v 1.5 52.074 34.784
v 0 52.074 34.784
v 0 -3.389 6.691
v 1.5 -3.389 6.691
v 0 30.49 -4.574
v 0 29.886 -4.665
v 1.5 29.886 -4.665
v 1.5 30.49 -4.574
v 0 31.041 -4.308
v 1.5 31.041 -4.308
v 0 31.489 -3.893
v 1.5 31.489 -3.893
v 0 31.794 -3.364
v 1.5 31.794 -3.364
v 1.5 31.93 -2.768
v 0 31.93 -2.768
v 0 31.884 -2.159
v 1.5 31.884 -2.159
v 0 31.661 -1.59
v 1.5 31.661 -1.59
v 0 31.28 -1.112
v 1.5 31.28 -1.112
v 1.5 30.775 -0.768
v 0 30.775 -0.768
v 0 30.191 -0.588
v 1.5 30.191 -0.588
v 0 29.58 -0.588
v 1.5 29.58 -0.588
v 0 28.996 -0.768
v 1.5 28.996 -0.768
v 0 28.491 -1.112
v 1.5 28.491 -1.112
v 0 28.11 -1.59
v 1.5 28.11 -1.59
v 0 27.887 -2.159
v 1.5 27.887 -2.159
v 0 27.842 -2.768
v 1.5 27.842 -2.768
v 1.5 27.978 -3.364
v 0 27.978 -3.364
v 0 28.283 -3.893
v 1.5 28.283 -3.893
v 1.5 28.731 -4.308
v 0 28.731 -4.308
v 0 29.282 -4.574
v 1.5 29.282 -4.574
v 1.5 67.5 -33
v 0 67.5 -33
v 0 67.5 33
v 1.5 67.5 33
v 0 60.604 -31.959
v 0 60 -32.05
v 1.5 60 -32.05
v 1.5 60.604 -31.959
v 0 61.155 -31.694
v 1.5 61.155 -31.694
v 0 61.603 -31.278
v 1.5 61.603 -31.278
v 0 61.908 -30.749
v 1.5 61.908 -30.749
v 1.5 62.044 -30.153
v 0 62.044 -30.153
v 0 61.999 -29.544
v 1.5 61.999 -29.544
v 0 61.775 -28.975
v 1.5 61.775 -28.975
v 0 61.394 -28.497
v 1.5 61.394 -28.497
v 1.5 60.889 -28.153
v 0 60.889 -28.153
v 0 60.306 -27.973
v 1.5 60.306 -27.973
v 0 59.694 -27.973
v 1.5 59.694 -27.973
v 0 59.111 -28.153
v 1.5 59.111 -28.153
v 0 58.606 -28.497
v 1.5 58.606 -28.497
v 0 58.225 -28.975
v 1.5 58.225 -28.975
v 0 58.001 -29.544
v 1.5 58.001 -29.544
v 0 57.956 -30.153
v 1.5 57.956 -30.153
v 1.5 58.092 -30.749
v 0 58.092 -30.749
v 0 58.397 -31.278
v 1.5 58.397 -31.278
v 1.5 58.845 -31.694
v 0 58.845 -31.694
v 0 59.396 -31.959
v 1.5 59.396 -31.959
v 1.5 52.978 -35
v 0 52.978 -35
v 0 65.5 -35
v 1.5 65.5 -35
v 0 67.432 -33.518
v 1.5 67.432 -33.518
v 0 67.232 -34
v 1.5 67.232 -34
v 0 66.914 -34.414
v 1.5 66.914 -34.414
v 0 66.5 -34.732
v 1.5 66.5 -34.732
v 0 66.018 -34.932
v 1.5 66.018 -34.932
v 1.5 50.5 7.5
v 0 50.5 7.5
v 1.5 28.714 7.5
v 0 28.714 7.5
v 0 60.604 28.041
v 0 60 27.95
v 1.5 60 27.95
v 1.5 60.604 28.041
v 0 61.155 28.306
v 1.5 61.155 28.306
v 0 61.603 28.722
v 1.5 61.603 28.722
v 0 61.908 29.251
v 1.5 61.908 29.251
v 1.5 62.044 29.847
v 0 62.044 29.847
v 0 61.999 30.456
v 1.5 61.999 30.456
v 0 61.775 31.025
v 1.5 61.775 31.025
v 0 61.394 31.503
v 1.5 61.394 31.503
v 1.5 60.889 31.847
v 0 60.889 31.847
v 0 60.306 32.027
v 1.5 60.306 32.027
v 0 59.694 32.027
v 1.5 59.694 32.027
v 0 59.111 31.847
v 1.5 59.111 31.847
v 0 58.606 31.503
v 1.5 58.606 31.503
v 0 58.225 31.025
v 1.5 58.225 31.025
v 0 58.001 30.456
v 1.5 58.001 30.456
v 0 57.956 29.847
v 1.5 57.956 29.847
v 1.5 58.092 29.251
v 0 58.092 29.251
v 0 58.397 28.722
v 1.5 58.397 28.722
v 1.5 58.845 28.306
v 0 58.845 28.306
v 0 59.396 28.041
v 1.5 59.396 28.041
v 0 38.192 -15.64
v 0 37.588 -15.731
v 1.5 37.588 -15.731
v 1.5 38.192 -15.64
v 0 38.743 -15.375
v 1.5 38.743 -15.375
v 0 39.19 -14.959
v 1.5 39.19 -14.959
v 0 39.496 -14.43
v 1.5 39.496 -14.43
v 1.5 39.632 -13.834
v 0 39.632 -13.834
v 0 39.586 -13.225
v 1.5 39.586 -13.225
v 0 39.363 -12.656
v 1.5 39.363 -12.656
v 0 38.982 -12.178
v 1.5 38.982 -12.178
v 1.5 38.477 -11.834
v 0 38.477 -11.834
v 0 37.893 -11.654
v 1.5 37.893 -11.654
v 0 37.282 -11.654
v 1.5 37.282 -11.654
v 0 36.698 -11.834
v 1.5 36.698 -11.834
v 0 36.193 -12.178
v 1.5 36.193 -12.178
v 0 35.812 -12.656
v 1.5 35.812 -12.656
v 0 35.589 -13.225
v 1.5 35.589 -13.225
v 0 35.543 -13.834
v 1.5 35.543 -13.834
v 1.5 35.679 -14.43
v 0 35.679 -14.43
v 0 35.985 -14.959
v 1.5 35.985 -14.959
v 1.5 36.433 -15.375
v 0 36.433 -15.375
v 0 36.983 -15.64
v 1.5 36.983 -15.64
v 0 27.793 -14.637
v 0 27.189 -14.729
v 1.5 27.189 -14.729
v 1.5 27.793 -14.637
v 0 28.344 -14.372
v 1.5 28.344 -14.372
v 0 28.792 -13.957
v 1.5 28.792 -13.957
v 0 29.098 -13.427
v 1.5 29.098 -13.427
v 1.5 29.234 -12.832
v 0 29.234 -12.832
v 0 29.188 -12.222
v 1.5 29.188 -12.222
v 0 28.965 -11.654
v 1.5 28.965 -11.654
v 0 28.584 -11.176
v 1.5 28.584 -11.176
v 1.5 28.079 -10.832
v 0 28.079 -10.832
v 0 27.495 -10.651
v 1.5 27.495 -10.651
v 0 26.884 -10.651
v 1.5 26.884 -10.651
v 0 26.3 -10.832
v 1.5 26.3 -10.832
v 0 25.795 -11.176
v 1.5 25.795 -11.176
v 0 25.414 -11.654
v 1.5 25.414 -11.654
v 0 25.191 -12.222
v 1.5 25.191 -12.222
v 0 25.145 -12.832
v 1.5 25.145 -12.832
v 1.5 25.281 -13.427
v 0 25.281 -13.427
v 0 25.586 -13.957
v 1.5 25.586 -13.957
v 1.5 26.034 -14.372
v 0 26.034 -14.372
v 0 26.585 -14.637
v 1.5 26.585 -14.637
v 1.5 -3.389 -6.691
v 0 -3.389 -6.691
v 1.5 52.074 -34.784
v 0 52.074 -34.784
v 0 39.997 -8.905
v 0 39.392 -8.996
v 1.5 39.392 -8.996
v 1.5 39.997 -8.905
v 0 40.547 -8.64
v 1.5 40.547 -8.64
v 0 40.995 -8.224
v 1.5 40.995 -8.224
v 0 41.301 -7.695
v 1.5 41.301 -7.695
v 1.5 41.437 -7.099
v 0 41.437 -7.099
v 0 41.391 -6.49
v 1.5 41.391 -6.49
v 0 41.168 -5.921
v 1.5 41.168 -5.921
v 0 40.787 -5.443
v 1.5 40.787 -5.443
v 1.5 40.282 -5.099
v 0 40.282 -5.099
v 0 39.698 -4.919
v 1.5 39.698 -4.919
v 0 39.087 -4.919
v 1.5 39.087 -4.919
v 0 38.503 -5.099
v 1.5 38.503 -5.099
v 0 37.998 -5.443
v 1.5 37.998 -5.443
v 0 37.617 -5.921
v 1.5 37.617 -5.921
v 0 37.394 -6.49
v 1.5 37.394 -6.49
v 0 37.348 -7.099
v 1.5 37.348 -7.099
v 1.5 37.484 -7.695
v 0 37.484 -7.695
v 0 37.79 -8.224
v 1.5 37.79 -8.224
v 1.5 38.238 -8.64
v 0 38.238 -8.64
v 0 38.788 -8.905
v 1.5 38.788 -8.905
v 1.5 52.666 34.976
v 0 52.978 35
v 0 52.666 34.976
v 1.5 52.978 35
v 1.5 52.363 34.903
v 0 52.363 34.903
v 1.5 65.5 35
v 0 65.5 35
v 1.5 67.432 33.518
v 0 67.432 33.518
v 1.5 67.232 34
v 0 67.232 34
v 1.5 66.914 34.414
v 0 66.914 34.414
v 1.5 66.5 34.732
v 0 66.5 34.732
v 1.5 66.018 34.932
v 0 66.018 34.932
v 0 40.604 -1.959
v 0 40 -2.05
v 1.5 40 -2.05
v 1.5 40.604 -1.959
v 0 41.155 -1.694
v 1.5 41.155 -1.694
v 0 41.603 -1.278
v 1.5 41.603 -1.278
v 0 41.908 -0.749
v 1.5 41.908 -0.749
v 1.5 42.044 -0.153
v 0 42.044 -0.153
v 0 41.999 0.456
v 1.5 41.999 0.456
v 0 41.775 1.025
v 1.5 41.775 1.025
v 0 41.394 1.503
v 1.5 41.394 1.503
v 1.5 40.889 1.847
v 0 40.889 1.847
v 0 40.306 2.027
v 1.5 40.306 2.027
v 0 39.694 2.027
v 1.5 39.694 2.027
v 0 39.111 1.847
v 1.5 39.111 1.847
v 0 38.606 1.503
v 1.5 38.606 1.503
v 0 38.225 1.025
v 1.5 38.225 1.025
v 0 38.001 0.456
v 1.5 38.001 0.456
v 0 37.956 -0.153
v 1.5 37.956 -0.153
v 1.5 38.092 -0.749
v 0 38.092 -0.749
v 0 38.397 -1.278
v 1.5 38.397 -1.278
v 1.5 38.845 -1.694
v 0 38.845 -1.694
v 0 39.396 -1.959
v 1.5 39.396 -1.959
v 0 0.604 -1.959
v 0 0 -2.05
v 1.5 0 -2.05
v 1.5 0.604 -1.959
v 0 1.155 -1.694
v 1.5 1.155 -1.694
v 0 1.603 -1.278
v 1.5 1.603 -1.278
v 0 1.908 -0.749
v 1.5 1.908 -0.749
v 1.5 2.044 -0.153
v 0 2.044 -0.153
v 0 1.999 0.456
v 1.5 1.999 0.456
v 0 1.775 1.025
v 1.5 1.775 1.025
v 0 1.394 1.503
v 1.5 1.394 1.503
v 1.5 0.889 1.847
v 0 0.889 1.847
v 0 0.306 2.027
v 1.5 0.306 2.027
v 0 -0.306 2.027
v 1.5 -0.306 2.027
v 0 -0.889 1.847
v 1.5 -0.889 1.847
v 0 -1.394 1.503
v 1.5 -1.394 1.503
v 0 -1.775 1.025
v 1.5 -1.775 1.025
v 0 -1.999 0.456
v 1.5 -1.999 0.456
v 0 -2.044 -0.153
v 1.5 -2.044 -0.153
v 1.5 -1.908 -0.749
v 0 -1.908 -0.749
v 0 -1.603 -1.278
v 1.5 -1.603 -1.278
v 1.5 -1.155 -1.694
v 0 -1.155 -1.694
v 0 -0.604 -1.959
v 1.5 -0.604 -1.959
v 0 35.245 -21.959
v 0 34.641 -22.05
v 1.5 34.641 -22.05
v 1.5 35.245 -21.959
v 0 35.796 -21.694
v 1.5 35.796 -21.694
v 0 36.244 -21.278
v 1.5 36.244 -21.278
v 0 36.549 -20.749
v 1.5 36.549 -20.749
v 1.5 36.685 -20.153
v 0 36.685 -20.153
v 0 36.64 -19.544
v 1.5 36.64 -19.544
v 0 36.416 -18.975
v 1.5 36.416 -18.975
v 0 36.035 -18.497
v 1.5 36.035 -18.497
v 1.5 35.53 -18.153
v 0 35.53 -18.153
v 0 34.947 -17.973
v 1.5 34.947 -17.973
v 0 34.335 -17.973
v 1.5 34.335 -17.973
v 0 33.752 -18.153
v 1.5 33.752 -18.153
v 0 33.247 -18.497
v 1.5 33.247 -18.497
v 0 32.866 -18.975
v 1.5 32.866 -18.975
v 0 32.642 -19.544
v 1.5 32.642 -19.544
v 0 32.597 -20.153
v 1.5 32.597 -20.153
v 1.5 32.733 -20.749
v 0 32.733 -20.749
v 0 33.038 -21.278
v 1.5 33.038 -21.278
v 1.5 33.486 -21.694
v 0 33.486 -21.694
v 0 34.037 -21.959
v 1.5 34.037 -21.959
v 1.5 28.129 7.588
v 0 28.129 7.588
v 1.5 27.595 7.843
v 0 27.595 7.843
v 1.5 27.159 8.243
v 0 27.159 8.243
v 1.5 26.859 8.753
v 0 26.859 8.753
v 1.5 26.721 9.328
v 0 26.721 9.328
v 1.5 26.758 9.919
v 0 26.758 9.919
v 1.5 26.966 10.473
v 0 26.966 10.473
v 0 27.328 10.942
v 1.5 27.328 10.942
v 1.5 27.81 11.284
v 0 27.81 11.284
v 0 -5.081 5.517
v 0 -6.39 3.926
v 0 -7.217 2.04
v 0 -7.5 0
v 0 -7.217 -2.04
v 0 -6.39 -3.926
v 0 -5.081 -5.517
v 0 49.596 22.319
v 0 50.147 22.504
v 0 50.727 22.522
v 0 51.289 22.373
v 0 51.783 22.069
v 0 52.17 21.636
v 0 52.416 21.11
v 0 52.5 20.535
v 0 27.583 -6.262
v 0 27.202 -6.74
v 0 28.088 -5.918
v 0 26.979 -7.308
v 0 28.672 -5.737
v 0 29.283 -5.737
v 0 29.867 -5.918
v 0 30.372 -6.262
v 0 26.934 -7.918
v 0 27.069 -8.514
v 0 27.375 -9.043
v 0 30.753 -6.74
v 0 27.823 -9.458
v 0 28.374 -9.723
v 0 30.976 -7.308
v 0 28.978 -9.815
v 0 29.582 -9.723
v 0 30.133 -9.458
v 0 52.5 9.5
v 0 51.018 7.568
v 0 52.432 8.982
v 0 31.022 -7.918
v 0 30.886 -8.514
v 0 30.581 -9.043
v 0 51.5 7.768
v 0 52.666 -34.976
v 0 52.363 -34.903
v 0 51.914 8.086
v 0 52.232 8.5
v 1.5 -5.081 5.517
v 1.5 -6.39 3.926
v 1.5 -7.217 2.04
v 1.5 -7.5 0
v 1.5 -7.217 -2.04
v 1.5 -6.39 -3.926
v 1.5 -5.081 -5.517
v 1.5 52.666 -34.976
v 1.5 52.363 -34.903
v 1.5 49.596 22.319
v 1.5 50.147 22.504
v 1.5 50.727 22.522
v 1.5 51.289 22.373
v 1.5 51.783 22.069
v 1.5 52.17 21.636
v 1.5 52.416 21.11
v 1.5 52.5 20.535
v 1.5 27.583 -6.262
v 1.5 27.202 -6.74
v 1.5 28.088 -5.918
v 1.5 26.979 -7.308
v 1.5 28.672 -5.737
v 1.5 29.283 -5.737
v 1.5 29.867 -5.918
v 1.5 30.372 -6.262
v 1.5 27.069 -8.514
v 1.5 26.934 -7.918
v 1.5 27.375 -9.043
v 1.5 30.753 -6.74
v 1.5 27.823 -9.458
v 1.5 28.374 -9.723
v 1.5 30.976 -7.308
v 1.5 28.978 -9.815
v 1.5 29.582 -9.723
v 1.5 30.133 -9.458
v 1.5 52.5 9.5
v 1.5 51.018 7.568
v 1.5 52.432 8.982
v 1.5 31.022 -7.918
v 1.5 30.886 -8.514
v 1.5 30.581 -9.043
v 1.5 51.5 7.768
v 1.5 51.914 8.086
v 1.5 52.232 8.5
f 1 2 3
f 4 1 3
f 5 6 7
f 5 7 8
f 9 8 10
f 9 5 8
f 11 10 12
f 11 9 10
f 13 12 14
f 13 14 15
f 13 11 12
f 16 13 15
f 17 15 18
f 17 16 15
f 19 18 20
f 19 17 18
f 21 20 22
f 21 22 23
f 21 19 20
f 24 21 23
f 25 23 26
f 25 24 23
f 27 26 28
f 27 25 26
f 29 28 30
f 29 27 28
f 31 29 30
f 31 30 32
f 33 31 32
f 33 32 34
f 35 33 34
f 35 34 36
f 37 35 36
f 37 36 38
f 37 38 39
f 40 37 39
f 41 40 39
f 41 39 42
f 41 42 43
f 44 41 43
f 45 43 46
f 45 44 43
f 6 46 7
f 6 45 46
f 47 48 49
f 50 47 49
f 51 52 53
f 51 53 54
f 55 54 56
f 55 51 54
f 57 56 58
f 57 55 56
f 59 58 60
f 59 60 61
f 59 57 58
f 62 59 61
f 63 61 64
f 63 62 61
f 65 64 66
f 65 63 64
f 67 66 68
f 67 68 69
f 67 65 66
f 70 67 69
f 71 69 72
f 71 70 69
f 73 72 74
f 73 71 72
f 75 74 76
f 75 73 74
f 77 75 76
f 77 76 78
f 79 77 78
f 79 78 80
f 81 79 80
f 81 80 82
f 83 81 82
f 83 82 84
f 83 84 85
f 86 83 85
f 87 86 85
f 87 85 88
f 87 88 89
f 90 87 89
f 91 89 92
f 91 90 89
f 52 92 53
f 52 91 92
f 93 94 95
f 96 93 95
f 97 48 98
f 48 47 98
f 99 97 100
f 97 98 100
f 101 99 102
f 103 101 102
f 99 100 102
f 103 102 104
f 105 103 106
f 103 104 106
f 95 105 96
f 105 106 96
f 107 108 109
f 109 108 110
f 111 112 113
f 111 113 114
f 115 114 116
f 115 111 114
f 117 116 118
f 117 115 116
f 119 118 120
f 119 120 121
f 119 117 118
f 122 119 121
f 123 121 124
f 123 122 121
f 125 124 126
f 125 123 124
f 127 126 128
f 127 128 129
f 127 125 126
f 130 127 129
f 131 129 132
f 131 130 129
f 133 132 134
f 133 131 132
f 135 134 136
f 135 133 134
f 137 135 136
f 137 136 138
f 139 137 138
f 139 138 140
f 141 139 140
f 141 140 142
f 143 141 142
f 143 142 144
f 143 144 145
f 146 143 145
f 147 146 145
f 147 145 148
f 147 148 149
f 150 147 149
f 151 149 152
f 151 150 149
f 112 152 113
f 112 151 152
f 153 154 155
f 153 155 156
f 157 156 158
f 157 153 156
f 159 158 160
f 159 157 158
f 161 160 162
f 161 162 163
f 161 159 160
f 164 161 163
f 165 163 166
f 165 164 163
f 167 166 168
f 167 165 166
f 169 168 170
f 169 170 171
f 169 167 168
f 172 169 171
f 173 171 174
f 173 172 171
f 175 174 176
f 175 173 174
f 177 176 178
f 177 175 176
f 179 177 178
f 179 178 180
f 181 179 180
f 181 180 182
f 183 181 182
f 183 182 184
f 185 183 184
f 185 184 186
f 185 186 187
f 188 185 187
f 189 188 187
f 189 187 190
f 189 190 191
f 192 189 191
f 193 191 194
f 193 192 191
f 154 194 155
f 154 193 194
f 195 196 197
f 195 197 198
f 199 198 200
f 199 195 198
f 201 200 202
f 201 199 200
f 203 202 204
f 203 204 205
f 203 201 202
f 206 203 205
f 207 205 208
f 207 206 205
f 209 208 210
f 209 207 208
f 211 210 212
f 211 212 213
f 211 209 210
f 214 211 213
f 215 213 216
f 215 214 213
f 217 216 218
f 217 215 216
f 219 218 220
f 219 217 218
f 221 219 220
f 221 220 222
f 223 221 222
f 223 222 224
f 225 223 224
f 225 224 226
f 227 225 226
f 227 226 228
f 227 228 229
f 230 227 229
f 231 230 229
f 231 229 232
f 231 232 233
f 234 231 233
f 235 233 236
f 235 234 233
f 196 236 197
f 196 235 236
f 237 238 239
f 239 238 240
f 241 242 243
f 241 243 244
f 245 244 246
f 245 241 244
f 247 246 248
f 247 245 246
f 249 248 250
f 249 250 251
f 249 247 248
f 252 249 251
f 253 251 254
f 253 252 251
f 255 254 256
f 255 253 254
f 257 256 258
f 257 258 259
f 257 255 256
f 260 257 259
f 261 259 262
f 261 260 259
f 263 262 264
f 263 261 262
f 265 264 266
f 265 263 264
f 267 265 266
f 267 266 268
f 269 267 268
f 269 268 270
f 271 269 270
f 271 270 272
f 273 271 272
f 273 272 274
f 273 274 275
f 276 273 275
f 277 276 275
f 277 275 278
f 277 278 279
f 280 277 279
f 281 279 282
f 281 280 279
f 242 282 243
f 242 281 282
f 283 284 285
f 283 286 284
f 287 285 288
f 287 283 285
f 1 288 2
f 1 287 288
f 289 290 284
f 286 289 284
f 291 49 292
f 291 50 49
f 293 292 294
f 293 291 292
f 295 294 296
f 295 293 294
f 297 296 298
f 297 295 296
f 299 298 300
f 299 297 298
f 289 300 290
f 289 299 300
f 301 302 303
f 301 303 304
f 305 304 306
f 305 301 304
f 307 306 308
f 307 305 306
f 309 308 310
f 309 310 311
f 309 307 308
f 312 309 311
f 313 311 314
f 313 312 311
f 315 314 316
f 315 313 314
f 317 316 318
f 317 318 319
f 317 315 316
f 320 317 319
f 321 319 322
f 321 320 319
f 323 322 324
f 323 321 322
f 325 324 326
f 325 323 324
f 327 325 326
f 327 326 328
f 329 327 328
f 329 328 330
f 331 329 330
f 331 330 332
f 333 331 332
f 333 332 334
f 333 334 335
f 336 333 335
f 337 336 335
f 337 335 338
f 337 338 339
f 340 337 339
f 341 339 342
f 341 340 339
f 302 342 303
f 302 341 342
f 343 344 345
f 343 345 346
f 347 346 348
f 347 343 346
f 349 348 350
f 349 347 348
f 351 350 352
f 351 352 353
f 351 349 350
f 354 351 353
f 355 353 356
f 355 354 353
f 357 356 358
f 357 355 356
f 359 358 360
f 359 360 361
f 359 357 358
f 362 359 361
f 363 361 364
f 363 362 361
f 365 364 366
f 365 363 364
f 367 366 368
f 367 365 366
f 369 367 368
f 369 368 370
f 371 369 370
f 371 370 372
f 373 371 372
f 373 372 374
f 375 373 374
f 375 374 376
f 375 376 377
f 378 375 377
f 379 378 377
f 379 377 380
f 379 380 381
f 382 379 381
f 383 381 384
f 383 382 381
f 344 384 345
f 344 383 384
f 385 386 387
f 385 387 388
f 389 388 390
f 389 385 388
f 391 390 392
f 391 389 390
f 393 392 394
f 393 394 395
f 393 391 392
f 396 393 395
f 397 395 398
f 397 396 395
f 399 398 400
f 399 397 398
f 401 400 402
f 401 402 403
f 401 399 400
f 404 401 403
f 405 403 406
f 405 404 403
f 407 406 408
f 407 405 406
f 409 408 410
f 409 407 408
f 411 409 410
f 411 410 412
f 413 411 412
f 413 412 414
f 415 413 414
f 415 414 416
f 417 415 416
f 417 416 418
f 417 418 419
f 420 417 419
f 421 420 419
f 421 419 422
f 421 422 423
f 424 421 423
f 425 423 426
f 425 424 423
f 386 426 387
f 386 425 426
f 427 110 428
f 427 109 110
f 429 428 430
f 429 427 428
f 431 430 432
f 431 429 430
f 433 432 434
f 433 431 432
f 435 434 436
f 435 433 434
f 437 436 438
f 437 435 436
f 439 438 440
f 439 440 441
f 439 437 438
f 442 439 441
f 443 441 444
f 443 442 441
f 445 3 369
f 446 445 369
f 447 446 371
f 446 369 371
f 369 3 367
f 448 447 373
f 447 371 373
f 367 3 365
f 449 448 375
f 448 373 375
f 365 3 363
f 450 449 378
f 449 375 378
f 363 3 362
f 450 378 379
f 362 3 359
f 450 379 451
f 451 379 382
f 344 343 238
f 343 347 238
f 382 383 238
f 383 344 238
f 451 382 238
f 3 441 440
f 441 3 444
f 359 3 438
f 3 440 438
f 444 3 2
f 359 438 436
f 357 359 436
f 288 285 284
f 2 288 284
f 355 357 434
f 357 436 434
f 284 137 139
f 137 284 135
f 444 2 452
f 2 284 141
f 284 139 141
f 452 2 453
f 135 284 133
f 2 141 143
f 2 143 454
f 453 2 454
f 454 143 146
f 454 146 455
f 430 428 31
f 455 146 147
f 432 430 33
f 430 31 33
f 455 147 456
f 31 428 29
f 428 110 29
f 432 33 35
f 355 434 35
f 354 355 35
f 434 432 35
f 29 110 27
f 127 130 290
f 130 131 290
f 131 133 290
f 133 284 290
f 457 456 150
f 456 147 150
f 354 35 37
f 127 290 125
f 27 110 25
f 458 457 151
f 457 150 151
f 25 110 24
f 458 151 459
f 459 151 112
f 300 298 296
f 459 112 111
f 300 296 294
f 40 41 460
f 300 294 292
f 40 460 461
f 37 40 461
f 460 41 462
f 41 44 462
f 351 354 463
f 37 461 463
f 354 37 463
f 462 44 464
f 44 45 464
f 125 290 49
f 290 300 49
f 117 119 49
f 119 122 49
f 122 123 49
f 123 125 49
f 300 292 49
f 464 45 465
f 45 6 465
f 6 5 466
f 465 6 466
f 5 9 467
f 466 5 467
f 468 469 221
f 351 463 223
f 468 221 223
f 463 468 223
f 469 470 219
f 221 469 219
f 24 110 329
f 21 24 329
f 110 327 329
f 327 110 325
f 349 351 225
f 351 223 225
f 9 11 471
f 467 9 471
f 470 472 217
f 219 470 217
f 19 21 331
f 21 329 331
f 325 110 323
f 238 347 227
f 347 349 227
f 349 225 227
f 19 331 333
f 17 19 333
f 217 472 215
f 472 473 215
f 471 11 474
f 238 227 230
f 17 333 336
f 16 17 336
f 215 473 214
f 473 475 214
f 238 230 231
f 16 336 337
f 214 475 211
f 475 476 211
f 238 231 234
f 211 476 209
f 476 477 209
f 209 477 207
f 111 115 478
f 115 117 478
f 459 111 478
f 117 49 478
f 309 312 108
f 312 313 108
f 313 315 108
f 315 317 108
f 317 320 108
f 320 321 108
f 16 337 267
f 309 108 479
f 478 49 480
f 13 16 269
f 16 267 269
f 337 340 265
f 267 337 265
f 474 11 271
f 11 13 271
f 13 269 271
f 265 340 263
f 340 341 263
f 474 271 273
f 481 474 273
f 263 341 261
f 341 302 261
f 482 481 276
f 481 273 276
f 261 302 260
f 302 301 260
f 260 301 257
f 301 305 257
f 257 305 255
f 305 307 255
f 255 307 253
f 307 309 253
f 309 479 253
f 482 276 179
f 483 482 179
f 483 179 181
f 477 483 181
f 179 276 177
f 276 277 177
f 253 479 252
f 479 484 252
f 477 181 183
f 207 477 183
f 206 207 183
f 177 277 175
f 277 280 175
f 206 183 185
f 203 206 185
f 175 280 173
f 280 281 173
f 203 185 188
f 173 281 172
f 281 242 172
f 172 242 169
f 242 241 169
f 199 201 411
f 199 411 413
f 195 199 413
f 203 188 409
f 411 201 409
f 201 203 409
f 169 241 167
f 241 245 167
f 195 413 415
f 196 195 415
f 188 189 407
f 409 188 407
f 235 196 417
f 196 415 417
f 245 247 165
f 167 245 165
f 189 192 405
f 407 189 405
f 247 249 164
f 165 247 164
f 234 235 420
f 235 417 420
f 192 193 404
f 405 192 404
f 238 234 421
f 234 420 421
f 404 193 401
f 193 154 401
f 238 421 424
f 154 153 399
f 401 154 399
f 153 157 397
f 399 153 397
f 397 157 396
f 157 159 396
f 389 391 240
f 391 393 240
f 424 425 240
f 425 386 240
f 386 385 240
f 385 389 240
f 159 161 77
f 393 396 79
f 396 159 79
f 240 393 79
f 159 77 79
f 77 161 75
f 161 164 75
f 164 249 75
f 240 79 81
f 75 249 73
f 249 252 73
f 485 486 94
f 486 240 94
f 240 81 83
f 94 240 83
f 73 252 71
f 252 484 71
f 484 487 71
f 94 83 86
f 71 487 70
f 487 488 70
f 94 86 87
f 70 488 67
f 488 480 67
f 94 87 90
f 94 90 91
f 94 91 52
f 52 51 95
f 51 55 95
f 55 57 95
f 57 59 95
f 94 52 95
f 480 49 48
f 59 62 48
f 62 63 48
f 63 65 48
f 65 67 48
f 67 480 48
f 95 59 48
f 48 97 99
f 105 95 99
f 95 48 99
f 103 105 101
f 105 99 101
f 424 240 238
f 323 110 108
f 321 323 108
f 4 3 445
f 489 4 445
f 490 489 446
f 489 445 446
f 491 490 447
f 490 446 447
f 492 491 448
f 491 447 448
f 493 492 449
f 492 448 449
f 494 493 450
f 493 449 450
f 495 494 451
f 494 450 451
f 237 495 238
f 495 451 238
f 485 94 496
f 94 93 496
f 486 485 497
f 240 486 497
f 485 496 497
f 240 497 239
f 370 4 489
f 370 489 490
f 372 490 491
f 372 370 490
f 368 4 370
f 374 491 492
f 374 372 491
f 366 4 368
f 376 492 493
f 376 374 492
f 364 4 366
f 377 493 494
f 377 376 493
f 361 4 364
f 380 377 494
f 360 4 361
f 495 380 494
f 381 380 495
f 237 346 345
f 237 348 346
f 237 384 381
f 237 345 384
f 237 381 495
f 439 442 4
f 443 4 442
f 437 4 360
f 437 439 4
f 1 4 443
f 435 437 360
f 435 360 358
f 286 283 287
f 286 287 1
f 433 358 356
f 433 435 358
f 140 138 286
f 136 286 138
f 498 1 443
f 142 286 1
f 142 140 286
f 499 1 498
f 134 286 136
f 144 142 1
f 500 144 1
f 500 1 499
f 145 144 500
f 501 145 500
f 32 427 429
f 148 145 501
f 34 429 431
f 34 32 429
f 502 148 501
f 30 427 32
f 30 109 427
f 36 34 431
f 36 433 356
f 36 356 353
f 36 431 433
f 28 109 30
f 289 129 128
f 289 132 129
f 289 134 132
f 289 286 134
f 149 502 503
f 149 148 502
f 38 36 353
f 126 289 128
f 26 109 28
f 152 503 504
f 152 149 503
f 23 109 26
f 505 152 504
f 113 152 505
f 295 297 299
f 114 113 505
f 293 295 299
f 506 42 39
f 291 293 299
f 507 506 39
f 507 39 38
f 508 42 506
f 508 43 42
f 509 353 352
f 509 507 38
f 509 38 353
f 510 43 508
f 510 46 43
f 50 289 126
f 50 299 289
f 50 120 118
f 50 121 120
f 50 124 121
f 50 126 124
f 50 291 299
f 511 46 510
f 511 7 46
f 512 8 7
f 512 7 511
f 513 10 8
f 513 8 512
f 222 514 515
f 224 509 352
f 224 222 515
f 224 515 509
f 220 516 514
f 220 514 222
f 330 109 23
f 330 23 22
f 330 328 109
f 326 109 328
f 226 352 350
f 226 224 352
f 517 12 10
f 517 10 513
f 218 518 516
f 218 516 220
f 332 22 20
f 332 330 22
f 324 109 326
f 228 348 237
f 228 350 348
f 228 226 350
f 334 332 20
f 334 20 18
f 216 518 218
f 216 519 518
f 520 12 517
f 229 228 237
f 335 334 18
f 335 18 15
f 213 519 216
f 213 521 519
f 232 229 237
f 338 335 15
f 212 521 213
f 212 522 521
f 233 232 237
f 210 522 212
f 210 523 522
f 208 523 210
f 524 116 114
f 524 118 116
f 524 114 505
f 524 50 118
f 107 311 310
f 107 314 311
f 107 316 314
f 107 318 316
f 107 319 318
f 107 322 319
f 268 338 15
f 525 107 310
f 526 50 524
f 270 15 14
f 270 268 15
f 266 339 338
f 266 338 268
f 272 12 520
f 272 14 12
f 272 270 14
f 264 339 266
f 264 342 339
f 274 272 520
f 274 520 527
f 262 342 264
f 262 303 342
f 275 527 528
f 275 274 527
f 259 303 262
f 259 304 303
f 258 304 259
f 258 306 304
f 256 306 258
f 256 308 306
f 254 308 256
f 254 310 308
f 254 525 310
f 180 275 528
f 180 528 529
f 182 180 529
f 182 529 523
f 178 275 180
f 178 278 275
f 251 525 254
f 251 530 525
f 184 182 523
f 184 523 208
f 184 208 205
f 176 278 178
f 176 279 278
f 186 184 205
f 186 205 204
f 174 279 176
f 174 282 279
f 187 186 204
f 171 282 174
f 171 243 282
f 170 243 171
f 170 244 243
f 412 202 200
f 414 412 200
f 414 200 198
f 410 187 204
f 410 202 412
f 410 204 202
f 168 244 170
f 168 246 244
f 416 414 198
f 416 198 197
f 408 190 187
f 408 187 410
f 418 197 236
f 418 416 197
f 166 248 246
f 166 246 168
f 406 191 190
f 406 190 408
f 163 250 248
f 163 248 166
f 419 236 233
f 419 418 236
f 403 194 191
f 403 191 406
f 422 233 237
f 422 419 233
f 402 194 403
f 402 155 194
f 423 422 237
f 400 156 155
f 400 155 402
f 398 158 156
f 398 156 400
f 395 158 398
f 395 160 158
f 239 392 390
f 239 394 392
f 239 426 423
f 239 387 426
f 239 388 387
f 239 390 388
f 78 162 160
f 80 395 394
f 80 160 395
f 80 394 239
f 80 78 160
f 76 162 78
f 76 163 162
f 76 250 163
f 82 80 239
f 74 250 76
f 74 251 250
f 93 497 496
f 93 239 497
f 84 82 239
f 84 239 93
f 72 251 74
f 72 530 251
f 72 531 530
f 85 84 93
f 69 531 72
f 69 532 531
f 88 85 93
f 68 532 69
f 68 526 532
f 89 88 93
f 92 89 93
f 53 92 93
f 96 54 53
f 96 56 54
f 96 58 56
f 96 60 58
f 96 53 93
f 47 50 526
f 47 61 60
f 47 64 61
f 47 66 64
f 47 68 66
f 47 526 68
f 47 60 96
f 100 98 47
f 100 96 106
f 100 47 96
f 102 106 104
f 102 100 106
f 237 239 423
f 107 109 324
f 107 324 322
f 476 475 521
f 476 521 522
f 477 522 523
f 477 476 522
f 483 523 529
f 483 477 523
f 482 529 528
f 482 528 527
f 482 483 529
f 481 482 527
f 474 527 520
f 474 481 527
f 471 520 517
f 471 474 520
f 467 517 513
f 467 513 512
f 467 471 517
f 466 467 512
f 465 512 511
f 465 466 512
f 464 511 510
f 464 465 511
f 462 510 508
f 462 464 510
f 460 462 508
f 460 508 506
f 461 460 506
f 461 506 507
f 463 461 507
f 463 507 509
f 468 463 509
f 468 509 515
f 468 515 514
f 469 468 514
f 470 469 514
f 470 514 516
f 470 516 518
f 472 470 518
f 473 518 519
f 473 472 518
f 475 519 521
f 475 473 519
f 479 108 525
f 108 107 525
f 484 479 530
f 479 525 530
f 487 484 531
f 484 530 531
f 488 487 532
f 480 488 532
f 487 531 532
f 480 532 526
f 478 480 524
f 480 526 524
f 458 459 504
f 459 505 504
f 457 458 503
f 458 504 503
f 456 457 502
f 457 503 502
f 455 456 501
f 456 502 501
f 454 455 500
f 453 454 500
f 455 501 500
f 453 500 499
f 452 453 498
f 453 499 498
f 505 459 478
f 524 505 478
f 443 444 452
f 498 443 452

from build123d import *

# Parameters (mm, degrees)
SKETCH_1_R      = 2.05
EXTRUDE_1_DEPTH = 1.5
FILLET_2_R      = 2


with BuildPart() as part:
    # ｽｹｯﾁ1 → ﾎﾞｽ - 押し出し1 (new body)
    with BuildSketch(Plane(origin=(0, 0, 0), x_dir=(0, 0, -1), z_dir=(1, 0, 0))):
        with BuildLine():
            Line((35, 67.5), (-35, 67.5))
            Line((-35, 67.5), (-35, 52.5))
            Line((-35, 52.5), (-6.690641581, -3.388999149))
            ThreePointArc((-6.690641581, -3.388999149), (0, -7.5), (6.690641581, -3.388999149))
            Line((6.690641581, -3.388999149), (35, 52.5))
            Line((35, 52.5), (35, 67.5))
        make_face()
        Circle(SKETCH_1_R, mode=Mode.SUBTRACT)
        with Locations((2.614672282, 29.885840943)):
            Circle(SKETCH_1_R, mode=Mode.SUBTRACT)
        with Locations((7.764571353, 28.977774789)):
            Circle(SKETCH_1_R, mode=Mode.SUBTRACT)
        with Locations((12.678547852, 27.189233611)):
            Circle(SKETCH_1_R, mode=Mode.SUBTRACT)
        Polygon((-7.5, 20.339282727), (-23.790312694, 52.5), (-7.5, 52.5), align=None, mode=Mode.SUBTRACT)
        with Locations((-30, 60)):
            Circle(SKETCH_1_R, mode=Mode.SUBTRACT)
        with Locations((13.680805733, 37.587704831)):
            Circle(SKETCH_1_R, mode=Mode.SUBTRACT)
        with Locations((0, 40)):
            Circle(SKETCH_1_R, mode=Mode.SUBTRACT)
        with Locations((6.945927107, 39.39231012)):
            Circle(SKETCH_1_R, mode=Mode.SUBTRACT)
        with Locations((20, 34.641016151)):
            Circle(SKETCH_1_R, mode=Mode.SUBTRACT)
        with Locations((30, 60)):
            Circle(SKETCH_1_R, mode=Mode.SUBTRACT)
    extrude(amount=EXTRUDE_1_DEPTH)

    # ﾌｨﾚｯﾄ2
    fillet_2_edges = [part.edges().sort_by_distance(p)[0] for p in [
        (0.75, 52.5, 35),
        (0.75, 67.5, 35),
        (0.75, 67.5, -35),
        (0.75, 52.5, -35),
        (0.75, 52.5, 23.790312694),
        (0.75, 20.339282727, 7.5),
        (0.75, 52.5, 7.5),
    ]]
    fillet(fillet_2_edges, radius=FILLET_2_R)


solid = part.part
